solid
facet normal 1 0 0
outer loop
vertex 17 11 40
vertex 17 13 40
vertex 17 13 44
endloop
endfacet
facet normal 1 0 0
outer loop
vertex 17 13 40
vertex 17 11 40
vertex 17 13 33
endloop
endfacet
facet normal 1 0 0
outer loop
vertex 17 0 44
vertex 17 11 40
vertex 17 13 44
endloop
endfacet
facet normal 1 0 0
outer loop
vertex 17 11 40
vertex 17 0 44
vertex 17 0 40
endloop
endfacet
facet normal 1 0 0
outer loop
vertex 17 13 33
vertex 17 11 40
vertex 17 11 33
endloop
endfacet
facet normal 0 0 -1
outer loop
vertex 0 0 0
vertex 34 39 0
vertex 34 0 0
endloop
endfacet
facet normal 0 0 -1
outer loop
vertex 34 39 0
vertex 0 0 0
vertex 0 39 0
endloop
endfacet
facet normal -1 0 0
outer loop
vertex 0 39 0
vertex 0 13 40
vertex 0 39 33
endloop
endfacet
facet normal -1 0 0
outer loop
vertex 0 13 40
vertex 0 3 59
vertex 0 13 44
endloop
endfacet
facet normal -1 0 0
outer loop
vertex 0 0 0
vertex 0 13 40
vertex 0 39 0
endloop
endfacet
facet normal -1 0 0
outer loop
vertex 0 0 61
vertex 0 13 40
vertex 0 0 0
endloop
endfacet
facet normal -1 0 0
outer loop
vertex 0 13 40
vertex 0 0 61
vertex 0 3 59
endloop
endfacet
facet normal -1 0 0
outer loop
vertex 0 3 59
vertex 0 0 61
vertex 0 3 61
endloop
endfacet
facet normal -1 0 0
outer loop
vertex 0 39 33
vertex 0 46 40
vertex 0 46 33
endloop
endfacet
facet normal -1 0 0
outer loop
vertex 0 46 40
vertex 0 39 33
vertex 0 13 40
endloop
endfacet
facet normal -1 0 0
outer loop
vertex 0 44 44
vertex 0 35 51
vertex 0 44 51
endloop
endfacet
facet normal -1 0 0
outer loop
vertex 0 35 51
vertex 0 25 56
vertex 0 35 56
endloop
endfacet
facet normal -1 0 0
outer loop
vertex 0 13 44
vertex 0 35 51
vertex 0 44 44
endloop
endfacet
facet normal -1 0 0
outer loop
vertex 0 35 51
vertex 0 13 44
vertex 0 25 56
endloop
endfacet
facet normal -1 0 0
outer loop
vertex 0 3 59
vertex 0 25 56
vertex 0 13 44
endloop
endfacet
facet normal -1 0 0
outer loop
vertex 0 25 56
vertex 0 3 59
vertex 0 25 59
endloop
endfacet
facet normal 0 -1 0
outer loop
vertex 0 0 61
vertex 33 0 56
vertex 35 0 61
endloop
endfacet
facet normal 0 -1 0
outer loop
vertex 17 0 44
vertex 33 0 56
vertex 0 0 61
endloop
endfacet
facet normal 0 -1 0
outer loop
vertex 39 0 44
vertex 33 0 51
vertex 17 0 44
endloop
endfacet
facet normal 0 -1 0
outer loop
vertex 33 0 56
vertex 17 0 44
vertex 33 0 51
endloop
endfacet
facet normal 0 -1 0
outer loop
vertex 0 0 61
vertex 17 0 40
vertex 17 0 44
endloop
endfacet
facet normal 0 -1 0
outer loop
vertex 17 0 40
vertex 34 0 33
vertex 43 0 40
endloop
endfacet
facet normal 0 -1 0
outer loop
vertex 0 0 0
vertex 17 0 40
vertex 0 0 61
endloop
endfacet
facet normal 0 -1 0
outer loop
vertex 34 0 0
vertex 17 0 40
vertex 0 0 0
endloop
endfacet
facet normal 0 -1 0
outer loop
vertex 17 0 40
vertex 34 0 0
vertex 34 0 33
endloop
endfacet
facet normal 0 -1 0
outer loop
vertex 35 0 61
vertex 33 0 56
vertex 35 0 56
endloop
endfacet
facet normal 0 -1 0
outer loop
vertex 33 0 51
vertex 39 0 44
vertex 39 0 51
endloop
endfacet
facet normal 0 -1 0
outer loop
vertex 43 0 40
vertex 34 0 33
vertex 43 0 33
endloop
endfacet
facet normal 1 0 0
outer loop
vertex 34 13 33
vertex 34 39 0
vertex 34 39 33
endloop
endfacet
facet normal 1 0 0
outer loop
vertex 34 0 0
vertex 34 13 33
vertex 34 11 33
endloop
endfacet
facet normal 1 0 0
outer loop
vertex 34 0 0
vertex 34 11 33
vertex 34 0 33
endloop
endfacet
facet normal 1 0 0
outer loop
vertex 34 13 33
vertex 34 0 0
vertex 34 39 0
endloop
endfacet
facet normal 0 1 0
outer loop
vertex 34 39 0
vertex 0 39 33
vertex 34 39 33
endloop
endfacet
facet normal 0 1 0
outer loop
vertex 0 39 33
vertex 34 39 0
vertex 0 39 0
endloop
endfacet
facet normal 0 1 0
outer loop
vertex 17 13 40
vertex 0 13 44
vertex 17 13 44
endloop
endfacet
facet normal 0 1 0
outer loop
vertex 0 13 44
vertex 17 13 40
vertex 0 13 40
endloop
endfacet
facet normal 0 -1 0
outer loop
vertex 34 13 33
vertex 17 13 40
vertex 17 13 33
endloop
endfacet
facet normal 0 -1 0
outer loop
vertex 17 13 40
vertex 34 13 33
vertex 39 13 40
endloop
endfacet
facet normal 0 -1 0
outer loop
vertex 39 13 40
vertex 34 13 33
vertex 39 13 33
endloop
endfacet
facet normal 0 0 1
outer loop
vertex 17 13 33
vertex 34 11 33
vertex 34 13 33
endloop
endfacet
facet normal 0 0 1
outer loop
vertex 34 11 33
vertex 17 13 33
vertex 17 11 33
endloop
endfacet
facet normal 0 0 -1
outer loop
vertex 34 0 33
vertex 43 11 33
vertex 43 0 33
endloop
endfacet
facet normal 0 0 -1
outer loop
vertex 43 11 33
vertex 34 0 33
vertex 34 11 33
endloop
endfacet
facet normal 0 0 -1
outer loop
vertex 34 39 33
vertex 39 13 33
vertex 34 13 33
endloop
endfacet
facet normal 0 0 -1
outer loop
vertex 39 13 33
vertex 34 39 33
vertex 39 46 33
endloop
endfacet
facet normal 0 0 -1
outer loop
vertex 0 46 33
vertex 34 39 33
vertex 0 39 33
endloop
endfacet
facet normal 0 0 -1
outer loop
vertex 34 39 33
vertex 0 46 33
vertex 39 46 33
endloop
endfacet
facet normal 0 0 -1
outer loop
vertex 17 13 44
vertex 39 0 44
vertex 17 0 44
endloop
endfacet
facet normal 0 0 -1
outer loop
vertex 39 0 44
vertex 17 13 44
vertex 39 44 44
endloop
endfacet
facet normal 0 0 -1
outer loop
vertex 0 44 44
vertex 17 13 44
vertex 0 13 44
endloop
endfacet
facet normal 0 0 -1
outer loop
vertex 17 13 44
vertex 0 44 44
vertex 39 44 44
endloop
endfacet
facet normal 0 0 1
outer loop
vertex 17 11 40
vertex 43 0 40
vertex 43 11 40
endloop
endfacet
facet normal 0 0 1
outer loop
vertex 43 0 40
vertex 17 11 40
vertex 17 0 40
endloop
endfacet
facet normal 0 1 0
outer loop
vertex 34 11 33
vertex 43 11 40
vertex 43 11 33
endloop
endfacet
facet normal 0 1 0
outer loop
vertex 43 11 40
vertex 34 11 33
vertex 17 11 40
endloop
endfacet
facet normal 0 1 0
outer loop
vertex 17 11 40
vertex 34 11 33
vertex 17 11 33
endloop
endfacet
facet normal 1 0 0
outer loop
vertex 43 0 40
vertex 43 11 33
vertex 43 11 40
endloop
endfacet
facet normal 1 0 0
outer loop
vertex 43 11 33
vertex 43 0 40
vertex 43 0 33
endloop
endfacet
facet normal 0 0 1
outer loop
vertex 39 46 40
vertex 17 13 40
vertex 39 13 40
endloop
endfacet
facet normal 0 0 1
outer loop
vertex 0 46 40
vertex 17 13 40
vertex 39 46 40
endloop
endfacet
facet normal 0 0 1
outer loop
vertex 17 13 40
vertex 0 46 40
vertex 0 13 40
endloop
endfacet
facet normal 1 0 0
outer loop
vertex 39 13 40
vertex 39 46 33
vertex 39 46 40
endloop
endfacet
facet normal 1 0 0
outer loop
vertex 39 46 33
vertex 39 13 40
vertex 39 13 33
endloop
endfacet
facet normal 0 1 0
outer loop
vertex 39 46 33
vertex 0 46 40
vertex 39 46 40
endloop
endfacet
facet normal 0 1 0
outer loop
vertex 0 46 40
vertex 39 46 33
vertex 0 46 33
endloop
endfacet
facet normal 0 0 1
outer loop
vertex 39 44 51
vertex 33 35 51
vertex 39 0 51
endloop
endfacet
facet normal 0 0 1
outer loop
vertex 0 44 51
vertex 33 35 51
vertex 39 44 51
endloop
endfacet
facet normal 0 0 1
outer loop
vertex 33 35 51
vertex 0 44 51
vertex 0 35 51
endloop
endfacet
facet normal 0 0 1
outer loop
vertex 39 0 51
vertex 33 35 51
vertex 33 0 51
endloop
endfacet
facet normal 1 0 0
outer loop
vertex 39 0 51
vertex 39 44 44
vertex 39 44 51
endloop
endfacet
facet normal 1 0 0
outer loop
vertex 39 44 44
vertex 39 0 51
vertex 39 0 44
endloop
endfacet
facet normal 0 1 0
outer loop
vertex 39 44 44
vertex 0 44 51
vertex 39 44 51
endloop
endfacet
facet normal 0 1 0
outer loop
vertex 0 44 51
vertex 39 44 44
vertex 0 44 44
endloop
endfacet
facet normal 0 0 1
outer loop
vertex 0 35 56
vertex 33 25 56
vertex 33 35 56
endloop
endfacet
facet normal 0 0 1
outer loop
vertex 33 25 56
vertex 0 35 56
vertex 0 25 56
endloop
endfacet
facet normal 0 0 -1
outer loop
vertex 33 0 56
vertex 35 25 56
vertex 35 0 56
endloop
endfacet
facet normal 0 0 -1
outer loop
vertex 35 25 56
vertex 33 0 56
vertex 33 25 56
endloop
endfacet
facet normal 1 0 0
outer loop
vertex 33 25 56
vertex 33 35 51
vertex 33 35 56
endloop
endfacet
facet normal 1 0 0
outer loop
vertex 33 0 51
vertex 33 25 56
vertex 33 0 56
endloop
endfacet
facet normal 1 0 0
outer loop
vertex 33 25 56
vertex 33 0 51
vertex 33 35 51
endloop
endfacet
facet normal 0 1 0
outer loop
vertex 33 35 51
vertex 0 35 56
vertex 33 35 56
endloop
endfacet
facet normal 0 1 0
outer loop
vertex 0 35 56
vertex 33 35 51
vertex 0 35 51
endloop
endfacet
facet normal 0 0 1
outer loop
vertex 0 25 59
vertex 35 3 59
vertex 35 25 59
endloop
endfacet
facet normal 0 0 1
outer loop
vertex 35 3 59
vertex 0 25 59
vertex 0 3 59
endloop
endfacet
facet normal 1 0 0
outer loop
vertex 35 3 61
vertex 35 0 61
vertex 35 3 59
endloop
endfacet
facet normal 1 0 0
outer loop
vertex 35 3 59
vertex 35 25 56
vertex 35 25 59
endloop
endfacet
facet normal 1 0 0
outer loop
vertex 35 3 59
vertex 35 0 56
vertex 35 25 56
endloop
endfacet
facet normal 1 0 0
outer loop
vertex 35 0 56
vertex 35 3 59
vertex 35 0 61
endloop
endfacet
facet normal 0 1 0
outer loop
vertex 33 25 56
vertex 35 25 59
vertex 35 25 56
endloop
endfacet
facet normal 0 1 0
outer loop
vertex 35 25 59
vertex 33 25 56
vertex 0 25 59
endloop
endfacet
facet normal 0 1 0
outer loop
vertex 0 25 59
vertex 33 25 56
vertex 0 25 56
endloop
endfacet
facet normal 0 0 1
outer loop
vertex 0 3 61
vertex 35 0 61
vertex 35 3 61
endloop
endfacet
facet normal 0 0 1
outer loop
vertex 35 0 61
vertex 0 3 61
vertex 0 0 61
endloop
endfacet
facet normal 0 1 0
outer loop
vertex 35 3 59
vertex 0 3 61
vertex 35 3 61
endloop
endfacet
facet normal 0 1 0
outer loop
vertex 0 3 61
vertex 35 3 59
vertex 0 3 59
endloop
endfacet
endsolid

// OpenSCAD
translate([8.5, 6.5, 5.5]) color([0.49183095909626395, 0.8633251831082008, 0.7171887463451895]) cube([17, 13, 11], center=true);
translate([25.5, 6.5, 5.5]) color([0.6735438085995347, 0.15137377239978678, 0.9867059242186832]) cube([17, 13, 11], center=true);
translate([8.5, 19.5, 5.5]) color([0.41114019628748133, 0.6117708643248599, 0.38668300553323576]) cube([17, 13, 11], center=true);
translate([25.5, 19.5, 5.5]) color([0.04703291581184044, 0.4708892090480652, 0.15136775389483625]) cube([17, 13, 11], center=true);
translate([8.5, 32.5, 5.5]) color([0.03246546237394399, 0.6174004236810055, 0.6299662912183356]) cube([17, 13, 11], center=true);
translate([25.5, 32.5, 5.5]) color([0.10529282465636491, 0.5491437662317772, 0.3466679766399683]) cube([17, 13, 11], center=true);
translate([8.5, 6.5, 16.5]) color([0.3834140731648874, 0.7764198986996783, 0.49031967752424566]) cube([17, 13, 11], center=true);
translate([25.5, 6.5, 16.5]) color([0.8812766154122413, 0.6101197429062234, 0.4671884150380703]) cube([17, 13, 11], center=true);
translate([8.5, 19.5, 16.5]) color([0.6323126400553846, 0.3378653798287524, 0.12432379252825243]) cube([17, 13, 11], center=true);
translate([25.5, 19.5, 16.5]) color([0.6825296186925238, 0.622037442746657, 0.7885664913738635]) cube([17, 13, 11], center=true);
translate([8.5, 32.5, 16.5]) color([0.1271091249471088, 0.9117833181295222, 0.799341211421814]) cube([17, 13, 11], center=true);
translate([25.5, 32.5, 16.5]) color([0.9168874080910093, 0.8725347217734669, 0.681006446357057]) cube([17, 13, 11], center=true);
translate([8.5, 6.5, 27.5]) color([0.8102508494373589, 0.5190073092314018, 0.7854891493606652]) cube([17, 13, 11], center=true);
translate([25.5, 6.5, 27.5]) color([0.18912746785718504, 0.7821141063572942, 0.44457960405634067]) cube([17, 13, 11], center=true);
translate([8.5, 19.5, 27.5]) color([0.756616221297365, 0.4554702368121878, 0.7895587282777832]) cube([17, 13, 11], center=true);
translate([25.5, 19.5, 27.5]) color([0.07533958521856021, 0.04464090542441246, 0.9342895823715677]) cube([17, 13, 11], center=true);
translate([8.5, 32.5, 27.5]) color([0.4861651007487351, 0.9010713996489047, 0.9447832518820701]) cube([17, 13, 11], center=true);
translate([25.5, 32.5, 27.5]) color([0.6665111524556335, 0.5717968260934746, 0.21597938410680917]) cube([17, 13, 11], center=true);
translate([8.5, 6.5, 38.5]) color([0.09347621929900818, 0.8193942150822732, 0.8887720676319878]) cube([17, 13, 11], center=true);
translate([23.5, 5.5, 36.5]) color([0.7793957106948857, 0.6985024327316249, 0.42011111607482077]) cube([13, 11, 7], center=true);
translate([36.5, 5.5, 36.5]) color([0.3053115900269564, 0.11344489563770899, 0.425970248072163]) cube([13, 11, 7], center=true);
translate([6.5, 18.5, 36.5]) color([0.5660129742477574, 0.9228805831375125, 0.9357547693309531]) cube([13, 11, 7], center=true);
translate([19.5, 18.5, 36.5]) color([0.41564119654091314, 0.0992109880980957, 0.7738187324714434]) cube([13, 11, 7], center=true);
translate([32.5, 18.5, 36.5]) color([0.7342793416571158, 0.03070084595190614, 0.4467185991338365]) cube([13, 11, 7], center=true);
translate([6.5, 29.5, 36.5]) color([0.6864181042985581, 0.030134234552269934, 0.9192823534016137]) cube([13, 11, 7], center=true);
translate([19.5, 29.5, 36.5]) color([0.9622424865104192, 0.72254277208884, 0.0785385396518038]) cube([13, 11, 7], center=true);
translate([32.5, 29.5, 36.5]) color([0.07032946587635569, 0.3592533148212369, 0.029377507756986443]) cube([13, 11, 7], center=true);
translate([6.5, 40.5, 36.5]) color([0.3478777272843395, 0.009964241312966027, 0.9743235128409679]) cube([13, 11, 7], center=true);
translate([19.5, 40.5, 36.5]) color([0.8190066990688627, 0.07051761147818736, 0.8934350918478603]) cube([13, 11, 7], center=true);
translate([32.5, 40.5, 36.5]) color([0.20797804000401565, 0.20479079826934998, 0.6737591455288341]) cube([13, 11, 7], center=true);
translate([6.5, 5.5, 47.5]) color([0.9382622681625481, 0.12318812122923739, 0.007184567252270457]) cube([13, 11, 7], center=true);
translate([19.5, 5.5, 47.5]) color([0.3691301471700257, 0.024650014436155776, 0.6048482375805311]) cube([13, 11, 7], center=true);
translate([32.5, 5.5, 47.5]) color([0.8591756086192088, 0.1869917024228578, 0.11239103583018406]) cube([13, 11, 7], center=true);
translate([6.5, 16.5, 47.5]) color([0.34444960733861085, 0.9591715206073138, 0.13015769442868408]) cube([13, 11, 7], center=true);
translate([19.5, 16.5, 47.5]) color([0.9665192604669938, 0.36223986994484925, 0.47337040276011155]) cube([13, 11, 7], center=true);
translate([32.5, 16.5, 47.5]) color([0.29263198596497353, 0.9371268442154698, 0.9581478949874975]) cube([13, 11, 7], center=true);
translate([6.5, 27.5, 47.5]) color([0.6359157065077434, 0.18404555017515556, 0.9929517886102871]) cube([13, 11, 7], center=true);
translate([19.5, 27.5, 47.5]) color([0.10258043954691198, 0.5808493815940804, 0.15640306008300875]) cube([13, 11, 7], center=true);
translate([32.5, 27.5, 47.5]) color([0.8976753141502056, 0.9456783914956152, 0.8043902980001079]) cube([13, 11, 7], center=true);
translate([6.5, 38.5, 47.5]) color([0.3158914186681244, 0.2428386899579852, 0.7548584132190378]) cube([13, 11, 7], center=true);
translate([19.5, 38.5, 47.5]) color([0.291059519145354, 0.4197853778540753, 0.04625567690264132]) cube([13, 11, 7], center=true);
translate([32.5, 38.5, 47.5]) color([0.13223381043380655, 0.020549620641776678, 0.0779211200935358]) cube([13, 11, 7], center=true);
translate([5.5, 3.5, 53.5]) color([0.07321114936486084, 0.42023170217414685, 0.5507771776374378]) cube([11, 7, 5], center=true);
translate([16.5, 3.5, 53.5]) color([0.740878819870922, 0.14228347384241602, 0.4221887461694188]) cube([11, 7, 5], center=true);
translate([27.5, 3.5, 53.5]) color([0.6369660374117204, 0.08455569481893255, 0.44481115514620384]) cube([11, 7, 5], center=true);
translate([5.5, 10.5, 53.5]) color([0.3692560392397978, 0.9489319289416618, 0.05785711390101722]) cube([11, 7, 5], center=true);
translate([16.5, 10.5, 53.5]) color([0.40862622118314806, 0.41722547979620506, 0.728180504599678]) cube([11, 7, 5], center=true);
translate([27.5, 10.5, 53.5]) color([0.3206710028745039, 0.20399027594623398, 0.2933116551663051]) cube([11, 7, 5], center=true);
translate([5.5, 17.5, 53.5]) color([0.4708875424493587, 0.9502683295716211, 0.7965170227633064]) cube([11, 7, 5], center=true);
translate([16.5, 17.5, 53.5]) color([0.2769702457797433, 0.5581815883930463, 0.6882003035685332]) cube([11, 7, 5], center=true);
translate([27.5, 17.5, 53.5]) color([0.7956571556821322, 0.4461643839498476, 0.398776905129706]) cube([11, 7, 5], center=true);
translate([5.5, 24.5, 53.5]) color([0.7676407428212785, 0.43171649556411207, 0.2479576688970051]) cube([11, 7, 5], center=true);
translate([16.5, 24.5, 53.5]) color([0.4534470315306477, 0.9371046462904561, 0.14256748821860132]) cube([11, 7, 5], center=true);
translate([27.5, 24.5, 53.5]) color([0.4624353545272121, 0.6373035243637815, 0.48328798826810027]) cube([11, 7, 5], center=true);
translate([5.5, 31.5, 53.5]) color([0.20363990437036994, 0.0018431606156659175, 0.698991711803439]) cube([11, 7, 5], center=true);
translate([16.5, 31.5, 53.5]) color([0.6187355180234525, 0.007776649435864202, 0.2985601210181208]) cube([11, 7, 5], center=true);
translate([27.5, 31.5, 53.5]) color([0.7686342595428415, 0.6289203785446209, 0.5452081159439722]) cube([11, 7, 5], center=true);
translate([3.5, 2.5, 57.5]) color([0.1562211098090489, 0.7062940429996885, 0.4714349217158037]) cube([7, 5, 3], center=true);
translate([10.5, 2.5, 57.5]) color([0.6781787462359636, 0.7600898367234922, 0.23236272144124515]) cube([7, 5, 3], center=true);
translate([17.5, 2.5, 57.5]) color([0.7619950130977117, 0.28008838468838926, 0.9840151371182455]) cube([7, 5, 3], center=true);
translate([24.5, 2.5, 57.5]) color([0.12083161078451865, 0.8837180187440564, 0.040547125043371324]) cube([7, 5, 3], center=true);
translate([31.5, 2.5, 57.5]) color([0.256575818348144, 0.5261019087624684, 0.5816161834445946]) cube([7, 5, 3], center=true);
translate([3.5, 7.5, 57.5]) color([0.3962349850280922, 0.10203172822707107, 0.2526080858247133]) cube([7, 5, 3], center=true);
translate([10.5, 7.5, 57.5]) color([0.28339650386048865, 0.7552228545587315, 0.9087743252220071]) cube([7, 5, 3], center=true);
translate([17.5, 7.5, 57.5]) color([0.5954099154864194, 0.03545096569102746, 0.7922364716417103]) cube([7, 5, 3], center=true);
translate([24.5, 7.5, 57.5]) color([0.30560393283991993, 0.33989040641624346, 0.5301854376454147]) cube([7, 5, 3], center=true);
translate([31.5, 7.5, 57.5]) color([0.24904704757555507, 0.9199780878573697, 0.1635547583408129]) cube([7, 5, 3], center=true);
translate([3.5, 12.5, 57.5]) color([0.41483040050373277, 0.2896919495072058, 0.5198341022016146]) cube([7, 5, 3], center=true);
translate([10.5, 12.5, 57.5]) color([0.5739818030823766, 0.6271396891048426, 0.5313758038379728]) cube([7, 5, 3], center=true);
translate([17.5, 12.5, 57.5]) color([0.4108045023355995, 0.634594012376466, 0.40341287658681757]) cube([7, 5, 3], center=true);
translate([24.5, 12.5, 57.5]) color([0.7785502590540477, 0.7881774252549901, 0.29225416811082217]) cube([7, 5, 3], center=true);
translate([31.5, 12.5, 57.5]) color([0.37180432355577453, 0.6288109059468862, 0.15706996711565713]) cube([7, 5, 3], center=true);
translate([3.5, 17.5, 57.5]) color([0.6970319309869248, 0.3814277529807131, 0.591062474757007]) cube([7, 5, 3], center=true);
translate([10.5, 17.5, 57.5]) color([0.1395330992312218, 0.6682583860975598, 0.3540578606136997]) cube([7, 5, 3], center=true);
translate([17.5, 17.5, 57.5]) color([0.4726655762072315, 0.4151074008495357, 0.47671524799509457]) cube([7, 5, 3], center=true);
translate([24.5, 17.5, 57.5]) color([0.6946956329164442, 0.31824017683207795, 0.6520544808985483]) cube([7, 5, 3], center=true);
translate([31.5, 17.5, 57.5]) color([0.060222107499701916, 0.3001851524622099, 0.7452096901500458]) cube([7, 5, 3], center=true);
translate([3.5, 22.5, 57.5]) color([0.05240587806206365, 0.6211421952822352, 0.025546799267838538]) cube([7, 5, 3], center=true);
translate([10.5, 22.5, 57.5]) color([0.4715288683099005, 0.8885450437134765, 0.010110093997603875]) cube([7, 5, 3], center=true);
translate([17.5, 22.5, 57.5]) color([0.5268280206539229, 0.06645682965886301, 0.8671097761494883]) cube([7, 5, 3], center=true);
translate([24.5, 22.5, 57.5]) color([0.6862965222396646, 0.7419538566814291, 0.669007579945888]) cube([7, 5, 3], center=true);
translate([31.5, 22.5, 57.5]) color([0.006423453698145676, 0.041177862257898545, 0.6208768040220466]) cube([7, 5, 3], center=true);
translate([2.5, 1.5, 60.0]) color([0.9996851255769114, 0.8731472390917929, 0.699685806725371]) cube([5, 3, 2], center=true);
translate([7.5, 1.5, 60.0]) color([0.7270999543422898, 0.2266870226016624, 0.751613934135812]) cube([5, 3, 2], center=true);
translate([12.5, 1.5, 60.0]) color([0.28792410486343756, 0.10546026702239297, 0.4608948954667579]) cube([5, 3, 2], center=true);
translate([17.5, 1.5, 60.0]) color([0.33019577252961807, 0.168255398651179, 0.42170989251140467]) cube([5, 3, 2], center=true);
translate([22.5, 1.5, 60.0]) color([0.8972009769638755, 0.4352702732981688, 0.4472918952497248]) cube([5, 3, 2], center=true);
translate([27.5, 1.5, 60.0]) color([0.708827757444238, 0.5241618701522923, 0.12922303534199353]) cube([5, 3, 2], center=true);
translate([32.5, 1.5, 60.0]) color([0.91039239754397, 0.4441243361619651, 0.7893377392253591]) cube([5, 3, 2], center=true);
